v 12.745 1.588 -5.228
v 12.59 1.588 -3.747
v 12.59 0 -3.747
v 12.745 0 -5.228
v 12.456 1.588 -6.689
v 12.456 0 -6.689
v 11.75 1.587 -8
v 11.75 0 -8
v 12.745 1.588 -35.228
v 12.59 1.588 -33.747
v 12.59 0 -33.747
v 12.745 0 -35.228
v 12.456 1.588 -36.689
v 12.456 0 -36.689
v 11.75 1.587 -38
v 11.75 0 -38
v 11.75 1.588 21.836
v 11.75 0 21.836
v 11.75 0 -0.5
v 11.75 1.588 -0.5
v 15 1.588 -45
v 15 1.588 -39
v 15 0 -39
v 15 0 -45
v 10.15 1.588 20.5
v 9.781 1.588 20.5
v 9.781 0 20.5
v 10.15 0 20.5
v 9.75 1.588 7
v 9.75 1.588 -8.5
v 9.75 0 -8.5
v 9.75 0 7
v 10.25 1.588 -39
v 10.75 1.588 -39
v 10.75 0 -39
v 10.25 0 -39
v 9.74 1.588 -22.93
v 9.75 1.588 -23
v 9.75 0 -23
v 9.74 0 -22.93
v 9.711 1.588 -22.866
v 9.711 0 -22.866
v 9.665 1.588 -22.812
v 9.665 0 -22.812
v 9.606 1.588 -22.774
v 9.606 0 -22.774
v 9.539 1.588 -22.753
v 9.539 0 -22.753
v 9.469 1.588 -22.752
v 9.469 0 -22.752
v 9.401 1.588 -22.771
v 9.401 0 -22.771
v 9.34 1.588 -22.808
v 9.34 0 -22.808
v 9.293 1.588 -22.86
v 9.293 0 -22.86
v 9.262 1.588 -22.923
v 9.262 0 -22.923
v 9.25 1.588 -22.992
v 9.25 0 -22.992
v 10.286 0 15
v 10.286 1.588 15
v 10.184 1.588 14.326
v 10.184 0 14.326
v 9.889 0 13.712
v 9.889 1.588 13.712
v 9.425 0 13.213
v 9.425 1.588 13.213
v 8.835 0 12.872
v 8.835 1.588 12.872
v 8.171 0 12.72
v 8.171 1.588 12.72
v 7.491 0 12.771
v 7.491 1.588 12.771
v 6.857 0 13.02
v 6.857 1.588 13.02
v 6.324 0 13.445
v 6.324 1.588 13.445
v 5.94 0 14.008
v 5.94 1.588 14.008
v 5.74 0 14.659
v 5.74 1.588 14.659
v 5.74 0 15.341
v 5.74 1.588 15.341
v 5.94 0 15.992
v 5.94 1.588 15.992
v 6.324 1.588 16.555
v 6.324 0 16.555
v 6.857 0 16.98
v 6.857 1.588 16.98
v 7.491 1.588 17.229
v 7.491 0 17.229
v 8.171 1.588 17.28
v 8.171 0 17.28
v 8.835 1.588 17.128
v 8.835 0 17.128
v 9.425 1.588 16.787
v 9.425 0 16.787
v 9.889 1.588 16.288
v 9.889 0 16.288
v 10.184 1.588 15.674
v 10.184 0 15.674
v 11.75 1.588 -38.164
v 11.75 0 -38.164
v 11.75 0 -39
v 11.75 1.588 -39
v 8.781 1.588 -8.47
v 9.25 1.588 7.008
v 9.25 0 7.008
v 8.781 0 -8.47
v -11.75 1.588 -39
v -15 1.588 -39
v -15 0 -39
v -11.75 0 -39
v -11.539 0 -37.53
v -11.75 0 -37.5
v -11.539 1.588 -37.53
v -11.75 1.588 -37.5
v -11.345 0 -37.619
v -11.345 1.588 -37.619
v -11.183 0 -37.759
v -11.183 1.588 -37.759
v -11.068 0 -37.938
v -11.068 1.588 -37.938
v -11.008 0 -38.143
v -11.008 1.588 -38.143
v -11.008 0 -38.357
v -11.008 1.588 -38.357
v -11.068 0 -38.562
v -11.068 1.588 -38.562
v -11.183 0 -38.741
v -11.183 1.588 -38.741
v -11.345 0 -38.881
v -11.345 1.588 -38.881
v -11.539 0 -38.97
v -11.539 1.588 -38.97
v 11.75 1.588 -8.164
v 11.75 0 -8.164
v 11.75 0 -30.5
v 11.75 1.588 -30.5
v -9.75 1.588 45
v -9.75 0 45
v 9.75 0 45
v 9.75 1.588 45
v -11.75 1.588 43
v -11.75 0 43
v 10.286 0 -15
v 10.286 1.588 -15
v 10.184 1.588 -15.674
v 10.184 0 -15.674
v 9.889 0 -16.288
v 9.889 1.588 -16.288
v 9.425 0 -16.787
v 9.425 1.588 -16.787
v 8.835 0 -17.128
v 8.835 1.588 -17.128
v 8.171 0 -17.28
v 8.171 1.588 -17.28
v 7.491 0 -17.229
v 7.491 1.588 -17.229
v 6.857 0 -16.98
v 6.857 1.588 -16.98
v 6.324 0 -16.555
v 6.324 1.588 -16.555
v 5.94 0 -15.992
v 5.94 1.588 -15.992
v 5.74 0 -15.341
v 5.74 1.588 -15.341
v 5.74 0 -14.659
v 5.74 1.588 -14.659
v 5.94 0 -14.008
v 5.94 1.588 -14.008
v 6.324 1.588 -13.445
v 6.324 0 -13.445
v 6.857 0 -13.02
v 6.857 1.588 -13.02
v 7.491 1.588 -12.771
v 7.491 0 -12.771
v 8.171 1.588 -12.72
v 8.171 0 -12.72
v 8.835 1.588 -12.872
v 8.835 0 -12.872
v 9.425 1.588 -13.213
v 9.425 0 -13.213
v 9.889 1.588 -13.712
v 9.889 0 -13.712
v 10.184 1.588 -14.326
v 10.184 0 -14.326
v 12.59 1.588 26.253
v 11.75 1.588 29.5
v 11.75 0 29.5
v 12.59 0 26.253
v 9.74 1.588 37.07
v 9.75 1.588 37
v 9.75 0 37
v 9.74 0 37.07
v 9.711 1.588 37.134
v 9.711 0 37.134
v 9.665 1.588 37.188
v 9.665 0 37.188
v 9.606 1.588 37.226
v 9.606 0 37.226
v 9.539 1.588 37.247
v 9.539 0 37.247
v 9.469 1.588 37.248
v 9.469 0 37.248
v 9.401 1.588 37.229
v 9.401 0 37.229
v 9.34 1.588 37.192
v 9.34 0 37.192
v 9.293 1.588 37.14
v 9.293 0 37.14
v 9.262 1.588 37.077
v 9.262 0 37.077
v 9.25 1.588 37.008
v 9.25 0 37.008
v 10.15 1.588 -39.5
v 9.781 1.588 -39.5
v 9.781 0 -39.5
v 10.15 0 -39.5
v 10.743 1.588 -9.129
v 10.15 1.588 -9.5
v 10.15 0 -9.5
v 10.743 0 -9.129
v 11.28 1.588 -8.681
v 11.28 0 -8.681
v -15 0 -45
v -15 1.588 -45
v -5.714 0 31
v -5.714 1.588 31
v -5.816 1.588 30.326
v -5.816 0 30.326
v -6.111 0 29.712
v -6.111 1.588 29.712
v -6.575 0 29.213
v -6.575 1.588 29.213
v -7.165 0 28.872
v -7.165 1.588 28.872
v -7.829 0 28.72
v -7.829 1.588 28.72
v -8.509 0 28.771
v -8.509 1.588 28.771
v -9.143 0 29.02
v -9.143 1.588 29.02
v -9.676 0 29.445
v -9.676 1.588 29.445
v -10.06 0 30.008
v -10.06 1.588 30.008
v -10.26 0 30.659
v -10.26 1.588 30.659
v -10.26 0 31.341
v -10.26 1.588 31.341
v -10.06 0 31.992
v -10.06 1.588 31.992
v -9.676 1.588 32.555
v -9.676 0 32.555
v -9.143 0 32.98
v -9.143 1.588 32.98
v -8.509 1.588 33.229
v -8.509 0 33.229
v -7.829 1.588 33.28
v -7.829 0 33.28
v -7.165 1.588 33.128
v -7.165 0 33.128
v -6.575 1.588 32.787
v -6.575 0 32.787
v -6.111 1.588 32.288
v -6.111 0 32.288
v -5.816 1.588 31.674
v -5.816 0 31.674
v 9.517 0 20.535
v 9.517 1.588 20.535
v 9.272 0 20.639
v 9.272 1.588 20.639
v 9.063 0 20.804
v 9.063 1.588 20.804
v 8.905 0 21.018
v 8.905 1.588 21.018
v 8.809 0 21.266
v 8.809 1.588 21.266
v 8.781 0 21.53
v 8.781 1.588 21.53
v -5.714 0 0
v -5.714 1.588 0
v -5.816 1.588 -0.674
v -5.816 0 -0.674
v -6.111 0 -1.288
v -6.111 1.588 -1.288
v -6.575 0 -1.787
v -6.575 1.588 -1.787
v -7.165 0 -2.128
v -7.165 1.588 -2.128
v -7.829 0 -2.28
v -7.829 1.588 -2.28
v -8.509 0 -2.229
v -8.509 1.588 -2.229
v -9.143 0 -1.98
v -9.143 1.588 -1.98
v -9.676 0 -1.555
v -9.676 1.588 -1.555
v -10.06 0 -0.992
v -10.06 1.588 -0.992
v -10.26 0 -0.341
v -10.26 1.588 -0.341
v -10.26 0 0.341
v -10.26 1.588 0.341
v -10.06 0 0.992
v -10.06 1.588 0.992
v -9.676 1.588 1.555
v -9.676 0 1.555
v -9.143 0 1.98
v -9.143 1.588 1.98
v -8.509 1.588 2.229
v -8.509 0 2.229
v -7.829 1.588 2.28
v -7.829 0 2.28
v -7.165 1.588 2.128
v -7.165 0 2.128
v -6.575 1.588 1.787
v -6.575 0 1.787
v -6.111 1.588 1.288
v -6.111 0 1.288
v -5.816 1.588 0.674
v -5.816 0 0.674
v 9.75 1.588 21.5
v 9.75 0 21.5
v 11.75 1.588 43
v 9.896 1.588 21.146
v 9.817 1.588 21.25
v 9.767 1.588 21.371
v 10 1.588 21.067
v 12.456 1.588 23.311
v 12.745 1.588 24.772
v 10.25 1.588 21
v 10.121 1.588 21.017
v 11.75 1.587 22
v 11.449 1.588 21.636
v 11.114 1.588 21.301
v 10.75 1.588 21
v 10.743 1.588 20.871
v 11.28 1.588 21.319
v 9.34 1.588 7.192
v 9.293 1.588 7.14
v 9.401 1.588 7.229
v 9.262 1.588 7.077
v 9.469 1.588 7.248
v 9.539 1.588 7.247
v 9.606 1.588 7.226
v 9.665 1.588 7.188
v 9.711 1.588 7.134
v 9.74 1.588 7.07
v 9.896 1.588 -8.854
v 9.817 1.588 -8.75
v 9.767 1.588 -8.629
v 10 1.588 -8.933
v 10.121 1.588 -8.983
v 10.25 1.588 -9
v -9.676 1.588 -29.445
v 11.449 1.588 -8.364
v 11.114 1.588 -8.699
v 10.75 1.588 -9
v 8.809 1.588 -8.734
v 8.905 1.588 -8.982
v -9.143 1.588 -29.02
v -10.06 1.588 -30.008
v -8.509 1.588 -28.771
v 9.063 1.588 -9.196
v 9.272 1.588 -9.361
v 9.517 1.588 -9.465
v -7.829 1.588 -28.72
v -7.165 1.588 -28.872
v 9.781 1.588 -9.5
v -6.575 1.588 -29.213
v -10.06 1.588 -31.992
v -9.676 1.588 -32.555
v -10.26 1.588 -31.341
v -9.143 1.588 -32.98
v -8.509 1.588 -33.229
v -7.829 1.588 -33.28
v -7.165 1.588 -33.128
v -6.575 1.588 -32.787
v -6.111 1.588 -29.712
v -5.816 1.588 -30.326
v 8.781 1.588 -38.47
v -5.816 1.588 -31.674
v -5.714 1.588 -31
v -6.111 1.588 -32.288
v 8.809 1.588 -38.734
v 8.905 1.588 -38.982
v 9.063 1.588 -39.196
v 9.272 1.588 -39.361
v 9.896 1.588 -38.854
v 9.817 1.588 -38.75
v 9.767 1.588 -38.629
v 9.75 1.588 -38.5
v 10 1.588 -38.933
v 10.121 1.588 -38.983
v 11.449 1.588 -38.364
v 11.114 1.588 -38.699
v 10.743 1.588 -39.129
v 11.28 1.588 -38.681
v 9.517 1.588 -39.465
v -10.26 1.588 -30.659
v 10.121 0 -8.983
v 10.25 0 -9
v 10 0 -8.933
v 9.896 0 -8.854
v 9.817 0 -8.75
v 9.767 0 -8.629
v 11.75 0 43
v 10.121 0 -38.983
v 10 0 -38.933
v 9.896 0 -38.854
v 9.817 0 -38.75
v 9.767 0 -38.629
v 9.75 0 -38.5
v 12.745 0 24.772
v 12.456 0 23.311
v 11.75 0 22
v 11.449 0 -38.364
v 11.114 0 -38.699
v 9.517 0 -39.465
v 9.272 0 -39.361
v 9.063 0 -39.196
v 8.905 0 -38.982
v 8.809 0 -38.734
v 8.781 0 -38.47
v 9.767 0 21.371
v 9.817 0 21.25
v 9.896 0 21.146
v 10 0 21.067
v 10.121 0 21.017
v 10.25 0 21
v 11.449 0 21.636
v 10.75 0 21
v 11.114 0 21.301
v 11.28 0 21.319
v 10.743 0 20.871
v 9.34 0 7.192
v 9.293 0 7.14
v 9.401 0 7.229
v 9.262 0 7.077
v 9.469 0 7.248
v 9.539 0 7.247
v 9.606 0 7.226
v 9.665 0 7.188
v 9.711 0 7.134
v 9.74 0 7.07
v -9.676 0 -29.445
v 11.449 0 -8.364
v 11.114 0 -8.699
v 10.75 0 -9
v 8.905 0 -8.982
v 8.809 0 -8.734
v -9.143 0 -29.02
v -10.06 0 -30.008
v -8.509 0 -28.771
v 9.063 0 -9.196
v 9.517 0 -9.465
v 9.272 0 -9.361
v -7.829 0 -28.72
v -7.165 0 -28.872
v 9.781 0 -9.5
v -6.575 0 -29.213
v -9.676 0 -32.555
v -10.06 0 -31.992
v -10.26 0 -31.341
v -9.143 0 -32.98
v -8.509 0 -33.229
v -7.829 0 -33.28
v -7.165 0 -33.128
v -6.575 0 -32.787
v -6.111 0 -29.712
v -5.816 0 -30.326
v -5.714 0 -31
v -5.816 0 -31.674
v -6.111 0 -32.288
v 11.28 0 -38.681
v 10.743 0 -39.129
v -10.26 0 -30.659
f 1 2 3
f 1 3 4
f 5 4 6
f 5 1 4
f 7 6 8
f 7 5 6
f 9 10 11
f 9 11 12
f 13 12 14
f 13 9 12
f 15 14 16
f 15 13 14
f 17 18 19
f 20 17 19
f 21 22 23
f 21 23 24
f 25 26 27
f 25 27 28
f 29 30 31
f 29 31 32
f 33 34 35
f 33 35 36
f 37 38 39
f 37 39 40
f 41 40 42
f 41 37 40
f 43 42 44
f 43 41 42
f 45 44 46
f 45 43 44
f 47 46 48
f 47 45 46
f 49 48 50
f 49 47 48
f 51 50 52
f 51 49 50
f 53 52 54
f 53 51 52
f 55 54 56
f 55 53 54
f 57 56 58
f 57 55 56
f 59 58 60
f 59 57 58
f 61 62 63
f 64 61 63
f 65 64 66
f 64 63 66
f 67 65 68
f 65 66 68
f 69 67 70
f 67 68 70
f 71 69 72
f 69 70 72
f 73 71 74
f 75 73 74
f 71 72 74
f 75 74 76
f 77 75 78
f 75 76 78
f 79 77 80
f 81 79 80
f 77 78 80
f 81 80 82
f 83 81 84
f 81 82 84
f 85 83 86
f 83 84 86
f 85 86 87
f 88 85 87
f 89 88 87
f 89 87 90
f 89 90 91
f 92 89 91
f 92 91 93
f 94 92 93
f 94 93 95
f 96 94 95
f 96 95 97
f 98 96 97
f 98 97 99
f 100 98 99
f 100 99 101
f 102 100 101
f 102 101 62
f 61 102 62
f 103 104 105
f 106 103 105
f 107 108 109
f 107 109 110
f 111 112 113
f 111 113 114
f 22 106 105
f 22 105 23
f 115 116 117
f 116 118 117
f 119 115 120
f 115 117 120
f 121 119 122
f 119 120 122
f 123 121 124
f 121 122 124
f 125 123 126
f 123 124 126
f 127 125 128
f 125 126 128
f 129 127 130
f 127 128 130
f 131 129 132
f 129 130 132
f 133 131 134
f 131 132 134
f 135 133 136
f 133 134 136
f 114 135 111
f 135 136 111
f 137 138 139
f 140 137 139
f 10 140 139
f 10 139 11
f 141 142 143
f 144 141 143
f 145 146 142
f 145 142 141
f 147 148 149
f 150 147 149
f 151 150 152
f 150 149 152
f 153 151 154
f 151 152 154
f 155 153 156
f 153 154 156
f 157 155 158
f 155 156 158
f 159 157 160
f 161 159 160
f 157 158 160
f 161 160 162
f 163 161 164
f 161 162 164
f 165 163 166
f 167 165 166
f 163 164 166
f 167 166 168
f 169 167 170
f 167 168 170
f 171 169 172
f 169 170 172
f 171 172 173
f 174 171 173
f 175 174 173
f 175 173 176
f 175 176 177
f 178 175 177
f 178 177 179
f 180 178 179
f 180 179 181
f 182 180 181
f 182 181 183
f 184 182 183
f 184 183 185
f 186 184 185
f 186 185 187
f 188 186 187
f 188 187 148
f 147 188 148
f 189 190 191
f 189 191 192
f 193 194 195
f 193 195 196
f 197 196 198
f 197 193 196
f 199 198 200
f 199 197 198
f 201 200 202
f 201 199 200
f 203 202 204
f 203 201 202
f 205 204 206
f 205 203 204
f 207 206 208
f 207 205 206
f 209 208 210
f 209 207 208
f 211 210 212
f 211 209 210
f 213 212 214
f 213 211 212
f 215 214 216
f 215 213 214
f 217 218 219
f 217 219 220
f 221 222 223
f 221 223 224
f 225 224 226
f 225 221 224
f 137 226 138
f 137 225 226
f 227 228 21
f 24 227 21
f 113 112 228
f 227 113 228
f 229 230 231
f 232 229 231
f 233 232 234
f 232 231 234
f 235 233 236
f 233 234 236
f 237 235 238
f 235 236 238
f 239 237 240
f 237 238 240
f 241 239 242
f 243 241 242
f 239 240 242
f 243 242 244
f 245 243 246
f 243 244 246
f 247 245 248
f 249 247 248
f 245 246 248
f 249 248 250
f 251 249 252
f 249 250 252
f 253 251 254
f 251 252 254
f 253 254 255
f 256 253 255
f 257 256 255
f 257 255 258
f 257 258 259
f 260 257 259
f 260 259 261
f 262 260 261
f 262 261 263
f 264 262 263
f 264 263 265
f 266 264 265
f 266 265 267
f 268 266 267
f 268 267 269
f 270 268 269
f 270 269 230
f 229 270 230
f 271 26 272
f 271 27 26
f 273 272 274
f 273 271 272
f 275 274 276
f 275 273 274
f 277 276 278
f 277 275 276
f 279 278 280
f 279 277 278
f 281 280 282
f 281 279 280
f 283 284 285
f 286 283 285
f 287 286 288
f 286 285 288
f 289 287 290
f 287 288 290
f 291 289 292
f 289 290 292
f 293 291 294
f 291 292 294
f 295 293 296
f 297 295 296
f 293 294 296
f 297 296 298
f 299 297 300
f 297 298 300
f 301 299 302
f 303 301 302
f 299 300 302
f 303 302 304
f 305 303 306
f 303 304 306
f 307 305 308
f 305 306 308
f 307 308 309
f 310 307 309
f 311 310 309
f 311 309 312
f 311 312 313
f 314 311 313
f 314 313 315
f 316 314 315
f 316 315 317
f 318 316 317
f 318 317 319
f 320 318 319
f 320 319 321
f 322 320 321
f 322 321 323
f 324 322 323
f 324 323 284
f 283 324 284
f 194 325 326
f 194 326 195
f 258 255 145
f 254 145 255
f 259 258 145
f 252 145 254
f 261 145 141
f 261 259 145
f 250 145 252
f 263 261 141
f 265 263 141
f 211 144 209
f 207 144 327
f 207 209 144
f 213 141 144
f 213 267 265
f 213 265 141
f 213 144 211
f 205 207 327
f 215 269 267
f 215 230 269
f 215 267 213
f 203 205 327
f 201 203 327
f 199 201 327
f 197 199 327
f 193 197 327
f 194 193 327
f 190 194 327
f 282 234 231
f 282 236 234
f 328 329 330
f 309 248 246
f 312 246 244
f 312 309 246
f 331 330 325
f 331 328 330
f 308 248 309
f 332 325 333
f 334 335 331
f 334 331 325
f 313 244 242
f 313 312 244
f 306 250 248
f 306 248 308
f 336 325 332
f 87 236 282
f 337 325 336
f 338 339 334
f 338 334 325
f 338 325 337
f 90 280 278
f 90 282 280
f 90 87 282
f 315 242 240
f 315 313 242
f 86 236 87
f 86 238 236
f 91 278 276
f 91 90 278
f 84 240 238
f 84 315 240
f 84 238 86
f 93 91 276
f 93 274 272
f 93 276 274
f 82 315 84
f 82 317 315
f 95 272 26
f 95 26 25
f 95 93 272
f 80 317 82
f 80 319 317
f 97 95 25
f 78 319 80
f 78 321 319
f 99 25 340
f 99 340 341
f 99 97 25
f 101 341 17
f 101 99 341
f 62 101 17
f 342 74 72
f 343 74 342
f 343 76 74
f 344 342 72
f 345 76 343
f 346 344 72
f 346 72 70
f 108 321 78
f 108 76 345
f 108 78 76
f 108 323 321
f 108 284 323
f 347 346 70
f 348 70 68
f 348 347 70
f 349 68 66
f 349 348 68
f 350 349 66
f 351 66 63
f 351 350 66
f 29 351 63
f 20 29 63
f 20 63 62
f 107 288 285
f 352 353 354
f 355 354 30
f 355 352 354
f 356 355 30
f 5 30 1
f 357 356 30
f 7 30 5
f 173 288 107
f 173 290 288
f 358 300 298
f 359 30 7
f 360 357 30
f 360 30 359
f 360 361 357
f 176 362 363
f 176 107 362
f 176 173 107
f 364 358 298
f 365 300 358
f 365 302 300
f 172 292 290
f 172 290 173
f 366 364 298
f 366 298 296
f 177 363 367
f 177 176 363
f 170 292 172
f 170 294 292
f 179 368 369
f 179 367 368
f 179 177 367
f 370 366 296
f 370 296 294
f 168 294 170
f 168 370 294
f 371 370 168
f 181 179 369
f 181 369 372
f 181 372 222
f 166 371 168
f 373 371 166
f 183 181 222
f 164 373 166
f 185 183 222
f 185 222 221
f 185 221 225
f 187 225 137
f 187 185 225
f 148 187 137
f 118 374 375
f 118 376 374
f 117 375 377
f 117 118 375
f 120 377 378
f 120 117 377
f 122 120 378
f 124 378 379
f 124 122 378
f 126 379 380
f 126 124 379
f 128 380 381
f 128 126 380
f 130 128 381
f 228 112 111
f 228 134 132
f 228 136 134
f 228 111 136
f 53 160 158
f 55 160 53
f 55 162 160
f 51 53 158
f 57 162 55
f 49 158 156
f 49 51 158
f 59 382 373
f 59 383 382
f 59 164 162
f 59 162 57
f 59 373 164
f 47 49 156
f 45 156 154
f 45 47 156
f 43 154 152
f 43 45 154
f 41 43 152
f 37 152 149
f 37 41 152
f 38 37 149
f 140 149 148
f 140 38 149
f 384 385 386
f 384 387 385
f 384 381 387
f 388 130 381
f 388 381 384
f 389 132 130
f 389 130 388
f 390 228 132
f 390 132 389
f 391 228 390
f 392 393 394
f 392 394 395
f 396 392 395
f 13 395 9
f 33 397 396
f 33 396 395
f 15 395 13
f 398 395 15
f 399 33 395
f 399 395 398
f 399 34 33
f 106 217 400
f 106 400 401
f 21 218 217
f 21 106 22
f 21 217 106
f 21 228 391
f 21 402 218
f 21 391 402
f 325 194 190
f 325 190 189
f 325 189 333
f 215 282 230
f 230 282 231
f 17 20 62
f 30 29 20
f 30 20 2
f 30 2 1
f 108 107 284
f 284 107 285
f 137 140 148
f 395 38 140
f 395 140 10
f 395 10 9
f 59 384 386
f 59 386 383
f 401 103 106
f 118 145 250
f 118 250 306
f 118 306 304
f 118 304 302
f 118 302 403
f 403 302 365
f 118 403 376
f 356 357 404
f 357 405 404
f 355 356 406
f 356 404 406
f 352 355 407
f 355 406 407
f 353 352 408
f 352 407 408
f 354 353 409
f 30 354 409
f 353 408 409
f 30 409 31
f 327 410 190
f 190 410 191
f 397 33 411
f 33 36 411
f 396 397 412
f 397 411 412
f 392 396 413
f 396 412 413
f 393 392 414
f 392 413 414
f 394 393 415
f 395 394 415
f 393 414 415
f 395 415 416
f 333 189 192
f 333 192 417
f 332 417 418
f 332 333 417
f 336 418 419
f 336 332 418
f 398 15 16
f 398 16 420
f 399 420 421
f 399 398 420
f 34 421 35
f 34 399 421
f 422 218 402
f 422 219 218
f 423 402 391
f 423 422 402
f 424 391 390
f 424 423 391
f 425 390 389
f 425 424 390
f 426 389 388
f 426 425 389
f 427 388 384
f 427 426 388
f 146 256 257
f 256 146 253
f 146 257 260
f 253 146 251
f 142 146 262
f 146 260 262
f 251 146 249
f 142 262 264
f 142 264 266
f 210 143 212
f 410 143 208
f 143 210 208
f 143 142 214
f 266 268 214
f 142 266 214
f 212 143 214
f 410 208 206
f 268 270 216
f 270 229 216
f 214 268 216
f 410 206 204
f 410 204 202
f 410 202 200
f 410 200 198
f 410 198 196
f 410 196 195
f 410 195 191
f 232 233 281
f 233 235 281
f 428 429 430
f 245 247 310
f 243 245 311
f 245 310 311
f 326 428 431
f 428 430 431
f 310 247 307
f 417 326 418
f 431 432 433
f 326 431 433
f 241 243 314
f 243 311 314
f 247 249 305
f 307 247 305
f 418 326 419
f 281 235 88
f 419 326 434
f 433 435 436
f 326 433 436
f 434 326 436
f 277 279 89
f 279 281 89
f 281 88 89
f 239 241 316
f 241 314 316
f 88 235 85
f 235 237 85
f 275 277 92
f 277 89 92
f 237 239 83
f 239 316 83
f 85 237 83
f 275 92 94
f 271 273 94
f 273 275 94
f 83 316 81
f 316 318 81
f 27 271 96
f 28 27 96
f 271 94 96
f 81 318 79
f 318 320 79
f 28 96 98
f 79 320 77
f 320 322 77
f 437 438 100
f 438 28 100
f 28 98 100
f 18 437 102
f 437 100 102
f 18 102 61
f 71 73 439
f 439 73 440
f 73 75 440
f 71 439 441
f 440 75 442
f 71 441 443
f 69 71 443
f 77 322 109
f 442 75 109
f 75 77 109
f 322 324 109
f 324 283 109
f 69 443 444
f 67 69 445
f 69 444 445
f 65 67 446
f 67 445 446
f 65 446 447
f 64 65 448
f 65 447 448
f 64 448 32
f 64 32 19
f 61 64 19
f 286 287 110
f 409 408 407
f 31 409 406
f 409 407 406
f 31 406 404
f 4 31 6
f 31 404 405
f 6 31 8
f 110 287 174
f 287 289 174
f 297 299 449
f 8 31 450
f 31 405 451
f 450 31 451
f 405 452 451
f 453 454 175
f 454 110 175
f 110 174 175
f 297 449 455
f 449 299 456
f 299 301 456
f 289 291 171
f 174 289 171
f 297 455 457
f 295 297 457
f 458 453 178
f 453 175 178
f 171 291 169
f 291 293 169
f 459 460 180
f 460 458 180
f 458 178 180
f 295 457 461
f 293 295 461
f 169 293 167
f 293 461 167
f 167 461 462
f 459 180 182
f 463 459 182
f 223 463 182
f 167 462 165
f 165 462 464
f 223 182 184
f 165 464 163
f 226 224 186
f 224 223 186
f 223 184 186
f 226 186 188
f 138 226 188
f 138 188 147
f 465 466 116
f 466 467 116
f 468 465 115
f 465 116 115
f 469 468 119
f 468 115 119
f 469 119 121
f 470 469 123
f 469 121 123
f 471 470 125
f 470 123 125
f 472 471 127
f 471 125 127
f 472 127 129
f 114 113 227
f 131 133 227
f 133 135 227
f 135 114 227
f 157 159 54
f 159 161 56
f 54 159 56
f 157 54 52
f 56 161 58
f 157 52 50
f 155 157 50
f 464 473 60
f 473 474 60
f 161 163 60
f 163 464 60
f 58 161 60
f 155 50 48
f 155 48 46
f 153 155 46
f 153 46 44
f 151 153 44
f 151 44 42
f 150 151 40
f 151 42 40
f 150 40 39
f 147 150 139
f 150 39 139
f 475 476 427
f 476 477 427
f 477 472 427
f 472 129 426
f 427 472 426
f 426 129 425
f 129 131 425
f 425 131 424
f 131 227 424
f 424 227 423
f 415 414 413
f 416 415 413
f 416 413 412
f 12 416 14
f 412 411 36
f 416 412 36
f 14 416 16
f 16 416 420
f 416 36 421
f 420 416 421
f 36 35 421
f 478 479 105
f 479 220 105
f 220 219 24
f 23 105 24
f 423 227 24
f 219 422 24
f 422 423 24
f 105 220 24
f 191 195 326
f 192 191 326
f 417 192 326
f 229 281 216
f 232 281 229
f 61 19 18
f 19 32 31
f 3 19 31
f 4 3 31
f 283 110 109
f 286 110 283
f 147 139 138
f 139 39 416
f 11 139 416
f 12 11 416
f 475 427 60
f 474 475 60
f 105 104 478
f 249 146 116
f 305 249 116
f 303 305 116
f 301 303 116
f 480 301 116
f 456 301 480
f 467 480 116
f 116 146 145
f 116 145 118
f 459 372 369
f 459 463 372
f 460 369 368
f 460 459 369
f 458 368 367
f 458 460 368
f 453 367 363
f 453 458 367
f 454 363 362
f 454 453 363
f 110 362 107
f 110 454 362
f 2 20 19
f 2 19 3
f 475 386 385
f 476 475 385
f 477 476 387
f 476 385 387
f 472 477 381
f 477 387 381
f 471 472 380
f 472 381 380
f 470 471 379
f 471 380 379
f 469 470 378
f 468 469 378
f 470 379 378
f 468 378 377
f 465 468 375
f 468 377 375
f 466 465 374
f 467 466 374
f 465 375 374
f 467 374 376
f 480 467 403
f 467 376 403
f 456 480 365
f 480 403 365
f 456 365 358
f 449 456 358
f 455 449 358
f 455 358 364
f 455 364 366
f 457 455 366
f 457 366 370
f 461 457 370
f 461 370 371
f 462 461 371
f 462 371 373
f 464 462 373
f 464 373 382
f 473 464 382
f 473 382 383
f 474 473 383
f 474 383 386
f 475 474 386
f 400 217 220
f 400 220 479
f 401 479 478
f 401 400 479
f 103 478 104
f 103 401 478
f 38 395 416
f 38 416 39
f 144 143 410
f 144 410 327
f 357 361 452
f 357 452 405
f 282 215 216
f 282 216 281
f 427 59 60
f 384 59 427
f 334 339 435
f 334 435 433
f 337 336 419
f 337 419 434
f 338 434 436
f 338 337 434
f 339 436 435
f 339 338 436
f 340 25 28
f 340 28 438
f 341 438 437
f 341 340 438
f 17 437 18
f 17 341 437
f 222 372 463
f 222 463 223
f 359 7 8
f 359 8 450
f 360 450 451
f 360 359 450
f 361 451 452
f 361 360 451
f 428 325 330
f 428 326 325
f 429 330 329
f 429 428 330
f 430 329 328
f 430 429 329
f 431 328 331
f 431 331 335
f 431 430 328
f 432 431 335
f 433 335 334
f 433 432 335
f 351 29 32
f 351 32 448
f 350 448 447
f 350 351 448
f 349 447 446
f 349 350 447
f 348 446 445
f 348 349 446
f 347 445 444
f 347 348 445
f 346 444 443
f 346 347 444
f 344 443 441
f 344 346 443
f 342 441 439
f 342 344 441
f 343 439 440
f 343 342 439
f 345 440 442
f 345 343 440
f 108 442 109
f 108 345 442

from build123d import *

# Parameters (mm, degrees)
SKETCH1_W           = 23.5
SKETCH1_H           = 90
BOSS_EXTRUDE1_DEPTH = 1.5875
BOSS_EXTRUDE2_DEPTH = 1.5875
CUT_EXTRUDE3_DEPTH  = 2.5875
LPATTERN1_COUNT     = 3
LPATTERN1_PITCH     = 30
SKETCH5_R           = 2.286
CUT_EXTRUDE4_DEPTH  = 2.5875
CHAMFER1_SIZE       = 2
SKETCH6_W           = 3.25
SKETCH6_H           = 6
BOSS_EXTRUDE3_DEPTH = 1.5875
FILLET1_R           = 1
FILLET2_R           = 0.5
SKETCH7_R           = 0.75
CUT_EXTRUDE5_DEPTH  = 2.5875


with BuildPart() as part:
    # Sketch1 → Boss-Extrude1 (new body)
    with BuildSketch(Plane(origin=(0, 0, 0), x_dir=(1, 0, 0), z_dir=(0, 1, 0))):
        Rectangle(SKETCH1_W, SKETCH1_H)
    extrude(amount=BOSS_EXTRUDE1_DEPTH)

    # Sketch2 → Boss-Extrude2 (add)
    with BuildSketch(Plane(origin=(0, 1.5875, 0), x_dir=(1, 0, 0), z_dir=(0, 1, 0))):
        with BuildLine():
            Line((11.75, -29.5), (12.590477082, -26.25290926))
            ThreePointArc((12.590477082, -26.25290926), (3.882734587, -21.830732226), (9.929449472, -29.5))
            Line((9.929449472, -29.5), (11.75, -29.5))
        make_face()
    boss_extrude2 = extrude(amount=-BOSS_EXTRUDE2_DEPTH)

    # Sketch4 → Cut-Extrude3 (cut, through all)
    with BuildSketch(Plane(origin=(0, 1.5875, 0), x_dir=(1, 0, 0), z_dir=(0, 1, 0))):
        with BuildLine():
            Line((10.75, -21), (9.75, -21))
            Line((9.75, -21), (9.75, -37))
            ThreePointArc((9.75, -37), (9.503785707, -37.249971335), (9.250114653, -37.007570546))
            Line((9.250114653, -37.007570546), (8.75, -20.5))
            Line((8.75, -20.5), (10.15, -20.5))
            ThreePointArc((10.15, -20.5), (11.018993513, -21.085452592), (11.75, -21.836141596))
            Line((11.75, -21.836141596), (11.75, -22))
            ThreePointArc((11.75, -22), (11.285533906, -21.464466094), (10.75, -21))
        make_face()
    cut_extrude3 = extrude(amount=-CUT_EXTRUDE3_DEPTH, mode=Mode.SUBTRACT)

    # LPattern1: Boss-Extrude2, Cut-Extrude3 ×3
    with Locations(*[(0, 0, -i * LPATTERN1_PITCH) for i in range(1, LPATTERN1_COUNT)]):
        add(boss_extrude2)
        add(cut_extrude3, mode=Mode.SUBTRACT)

    # Sketch5 → Cut-Extrude4 (cut, through all)
    with BuildSketch(Plane(origin=(0, 1.5875, 0), x_dir=(1, 0, 0), z_dir=(0, 1, 0))):
        with Locations((-8, -31)):
            Circle(SKETCH5_R)
        with Locations((8, -15)):
            Circle(SKETCH5_R)
        with Locations((-8, 31)):
            Circle(SKETCH5_R)
        with Locations((8, 15)):
            Circle(SKETCH5_R)
        with Locations((-8, 0)):
            Circle(SKETCH5_R)
    extrude(amount=-CUT_EXTRUDE4_DEPTH, mode=Mode.SUBTRACT)

    # Chamfer1
    chamfer1_edges = [part.edges().sort_by_distance(p)[0] for p in [
        (11.75, 0.79375, 45),
        (-11.75, 0.79375, 45),
    ]]
    chamfer(chamfer1_edges, length=CHAMFER1_SIZE)

    # Sketch6 → Boss-Extrude3 (add)
    with BuildSketch(Plane(origin=(0, 1.5875, 0), x_dir=(1, 0, 0), z_dir=(0, 1, 0))):
        with Locations((-13.375, 42)):
            Rectangle(SKETCH6_W, SKETCH6_H)
        with Locations((13.375, 42)):
            Rectangle(SKETCH6_W, SKETCH6_H)
    extrude(amount=-BOSS_EXTRUDE3_DEPTH)

    # Fillet1
    fillet1_edges = [part.edges().sort_by_distance(p)[0] for p in [
        (8.75, 0.79375, -39.5),
        (8.75, 0.79375, 20.5),
        (8.75, 0.79375, -9.5),
    ]]
    fillet(fillet1_edges, radius=FILLET1_R)

    # Fillet2
    fillet2_edges = [part.edges().sort_by_distance(p)[0] for p in [
        (9.75, 0.79375, -39),
        (9.75, 0.79375, 21),
        (9.75, 0.79375, -9),
    ]]
    fillet(fillet2_edges, radius=FILLET2_R)

    # Sketch7 → Cut-Extrude5 (cut, through all)
    with BuildSketch(Plane(origin=(0, 1.5875, 0), x_dir=(1, 0, 0), z_dir=(0, 1, 0))):
        with Locations((-11.75, 38.25)):
            Circle(SKETCH7_R)
    extrude(amount=-CUT_EXTRUDE5_DEPTH, mode=Mode.SUBTRACT)


solid = part.part
